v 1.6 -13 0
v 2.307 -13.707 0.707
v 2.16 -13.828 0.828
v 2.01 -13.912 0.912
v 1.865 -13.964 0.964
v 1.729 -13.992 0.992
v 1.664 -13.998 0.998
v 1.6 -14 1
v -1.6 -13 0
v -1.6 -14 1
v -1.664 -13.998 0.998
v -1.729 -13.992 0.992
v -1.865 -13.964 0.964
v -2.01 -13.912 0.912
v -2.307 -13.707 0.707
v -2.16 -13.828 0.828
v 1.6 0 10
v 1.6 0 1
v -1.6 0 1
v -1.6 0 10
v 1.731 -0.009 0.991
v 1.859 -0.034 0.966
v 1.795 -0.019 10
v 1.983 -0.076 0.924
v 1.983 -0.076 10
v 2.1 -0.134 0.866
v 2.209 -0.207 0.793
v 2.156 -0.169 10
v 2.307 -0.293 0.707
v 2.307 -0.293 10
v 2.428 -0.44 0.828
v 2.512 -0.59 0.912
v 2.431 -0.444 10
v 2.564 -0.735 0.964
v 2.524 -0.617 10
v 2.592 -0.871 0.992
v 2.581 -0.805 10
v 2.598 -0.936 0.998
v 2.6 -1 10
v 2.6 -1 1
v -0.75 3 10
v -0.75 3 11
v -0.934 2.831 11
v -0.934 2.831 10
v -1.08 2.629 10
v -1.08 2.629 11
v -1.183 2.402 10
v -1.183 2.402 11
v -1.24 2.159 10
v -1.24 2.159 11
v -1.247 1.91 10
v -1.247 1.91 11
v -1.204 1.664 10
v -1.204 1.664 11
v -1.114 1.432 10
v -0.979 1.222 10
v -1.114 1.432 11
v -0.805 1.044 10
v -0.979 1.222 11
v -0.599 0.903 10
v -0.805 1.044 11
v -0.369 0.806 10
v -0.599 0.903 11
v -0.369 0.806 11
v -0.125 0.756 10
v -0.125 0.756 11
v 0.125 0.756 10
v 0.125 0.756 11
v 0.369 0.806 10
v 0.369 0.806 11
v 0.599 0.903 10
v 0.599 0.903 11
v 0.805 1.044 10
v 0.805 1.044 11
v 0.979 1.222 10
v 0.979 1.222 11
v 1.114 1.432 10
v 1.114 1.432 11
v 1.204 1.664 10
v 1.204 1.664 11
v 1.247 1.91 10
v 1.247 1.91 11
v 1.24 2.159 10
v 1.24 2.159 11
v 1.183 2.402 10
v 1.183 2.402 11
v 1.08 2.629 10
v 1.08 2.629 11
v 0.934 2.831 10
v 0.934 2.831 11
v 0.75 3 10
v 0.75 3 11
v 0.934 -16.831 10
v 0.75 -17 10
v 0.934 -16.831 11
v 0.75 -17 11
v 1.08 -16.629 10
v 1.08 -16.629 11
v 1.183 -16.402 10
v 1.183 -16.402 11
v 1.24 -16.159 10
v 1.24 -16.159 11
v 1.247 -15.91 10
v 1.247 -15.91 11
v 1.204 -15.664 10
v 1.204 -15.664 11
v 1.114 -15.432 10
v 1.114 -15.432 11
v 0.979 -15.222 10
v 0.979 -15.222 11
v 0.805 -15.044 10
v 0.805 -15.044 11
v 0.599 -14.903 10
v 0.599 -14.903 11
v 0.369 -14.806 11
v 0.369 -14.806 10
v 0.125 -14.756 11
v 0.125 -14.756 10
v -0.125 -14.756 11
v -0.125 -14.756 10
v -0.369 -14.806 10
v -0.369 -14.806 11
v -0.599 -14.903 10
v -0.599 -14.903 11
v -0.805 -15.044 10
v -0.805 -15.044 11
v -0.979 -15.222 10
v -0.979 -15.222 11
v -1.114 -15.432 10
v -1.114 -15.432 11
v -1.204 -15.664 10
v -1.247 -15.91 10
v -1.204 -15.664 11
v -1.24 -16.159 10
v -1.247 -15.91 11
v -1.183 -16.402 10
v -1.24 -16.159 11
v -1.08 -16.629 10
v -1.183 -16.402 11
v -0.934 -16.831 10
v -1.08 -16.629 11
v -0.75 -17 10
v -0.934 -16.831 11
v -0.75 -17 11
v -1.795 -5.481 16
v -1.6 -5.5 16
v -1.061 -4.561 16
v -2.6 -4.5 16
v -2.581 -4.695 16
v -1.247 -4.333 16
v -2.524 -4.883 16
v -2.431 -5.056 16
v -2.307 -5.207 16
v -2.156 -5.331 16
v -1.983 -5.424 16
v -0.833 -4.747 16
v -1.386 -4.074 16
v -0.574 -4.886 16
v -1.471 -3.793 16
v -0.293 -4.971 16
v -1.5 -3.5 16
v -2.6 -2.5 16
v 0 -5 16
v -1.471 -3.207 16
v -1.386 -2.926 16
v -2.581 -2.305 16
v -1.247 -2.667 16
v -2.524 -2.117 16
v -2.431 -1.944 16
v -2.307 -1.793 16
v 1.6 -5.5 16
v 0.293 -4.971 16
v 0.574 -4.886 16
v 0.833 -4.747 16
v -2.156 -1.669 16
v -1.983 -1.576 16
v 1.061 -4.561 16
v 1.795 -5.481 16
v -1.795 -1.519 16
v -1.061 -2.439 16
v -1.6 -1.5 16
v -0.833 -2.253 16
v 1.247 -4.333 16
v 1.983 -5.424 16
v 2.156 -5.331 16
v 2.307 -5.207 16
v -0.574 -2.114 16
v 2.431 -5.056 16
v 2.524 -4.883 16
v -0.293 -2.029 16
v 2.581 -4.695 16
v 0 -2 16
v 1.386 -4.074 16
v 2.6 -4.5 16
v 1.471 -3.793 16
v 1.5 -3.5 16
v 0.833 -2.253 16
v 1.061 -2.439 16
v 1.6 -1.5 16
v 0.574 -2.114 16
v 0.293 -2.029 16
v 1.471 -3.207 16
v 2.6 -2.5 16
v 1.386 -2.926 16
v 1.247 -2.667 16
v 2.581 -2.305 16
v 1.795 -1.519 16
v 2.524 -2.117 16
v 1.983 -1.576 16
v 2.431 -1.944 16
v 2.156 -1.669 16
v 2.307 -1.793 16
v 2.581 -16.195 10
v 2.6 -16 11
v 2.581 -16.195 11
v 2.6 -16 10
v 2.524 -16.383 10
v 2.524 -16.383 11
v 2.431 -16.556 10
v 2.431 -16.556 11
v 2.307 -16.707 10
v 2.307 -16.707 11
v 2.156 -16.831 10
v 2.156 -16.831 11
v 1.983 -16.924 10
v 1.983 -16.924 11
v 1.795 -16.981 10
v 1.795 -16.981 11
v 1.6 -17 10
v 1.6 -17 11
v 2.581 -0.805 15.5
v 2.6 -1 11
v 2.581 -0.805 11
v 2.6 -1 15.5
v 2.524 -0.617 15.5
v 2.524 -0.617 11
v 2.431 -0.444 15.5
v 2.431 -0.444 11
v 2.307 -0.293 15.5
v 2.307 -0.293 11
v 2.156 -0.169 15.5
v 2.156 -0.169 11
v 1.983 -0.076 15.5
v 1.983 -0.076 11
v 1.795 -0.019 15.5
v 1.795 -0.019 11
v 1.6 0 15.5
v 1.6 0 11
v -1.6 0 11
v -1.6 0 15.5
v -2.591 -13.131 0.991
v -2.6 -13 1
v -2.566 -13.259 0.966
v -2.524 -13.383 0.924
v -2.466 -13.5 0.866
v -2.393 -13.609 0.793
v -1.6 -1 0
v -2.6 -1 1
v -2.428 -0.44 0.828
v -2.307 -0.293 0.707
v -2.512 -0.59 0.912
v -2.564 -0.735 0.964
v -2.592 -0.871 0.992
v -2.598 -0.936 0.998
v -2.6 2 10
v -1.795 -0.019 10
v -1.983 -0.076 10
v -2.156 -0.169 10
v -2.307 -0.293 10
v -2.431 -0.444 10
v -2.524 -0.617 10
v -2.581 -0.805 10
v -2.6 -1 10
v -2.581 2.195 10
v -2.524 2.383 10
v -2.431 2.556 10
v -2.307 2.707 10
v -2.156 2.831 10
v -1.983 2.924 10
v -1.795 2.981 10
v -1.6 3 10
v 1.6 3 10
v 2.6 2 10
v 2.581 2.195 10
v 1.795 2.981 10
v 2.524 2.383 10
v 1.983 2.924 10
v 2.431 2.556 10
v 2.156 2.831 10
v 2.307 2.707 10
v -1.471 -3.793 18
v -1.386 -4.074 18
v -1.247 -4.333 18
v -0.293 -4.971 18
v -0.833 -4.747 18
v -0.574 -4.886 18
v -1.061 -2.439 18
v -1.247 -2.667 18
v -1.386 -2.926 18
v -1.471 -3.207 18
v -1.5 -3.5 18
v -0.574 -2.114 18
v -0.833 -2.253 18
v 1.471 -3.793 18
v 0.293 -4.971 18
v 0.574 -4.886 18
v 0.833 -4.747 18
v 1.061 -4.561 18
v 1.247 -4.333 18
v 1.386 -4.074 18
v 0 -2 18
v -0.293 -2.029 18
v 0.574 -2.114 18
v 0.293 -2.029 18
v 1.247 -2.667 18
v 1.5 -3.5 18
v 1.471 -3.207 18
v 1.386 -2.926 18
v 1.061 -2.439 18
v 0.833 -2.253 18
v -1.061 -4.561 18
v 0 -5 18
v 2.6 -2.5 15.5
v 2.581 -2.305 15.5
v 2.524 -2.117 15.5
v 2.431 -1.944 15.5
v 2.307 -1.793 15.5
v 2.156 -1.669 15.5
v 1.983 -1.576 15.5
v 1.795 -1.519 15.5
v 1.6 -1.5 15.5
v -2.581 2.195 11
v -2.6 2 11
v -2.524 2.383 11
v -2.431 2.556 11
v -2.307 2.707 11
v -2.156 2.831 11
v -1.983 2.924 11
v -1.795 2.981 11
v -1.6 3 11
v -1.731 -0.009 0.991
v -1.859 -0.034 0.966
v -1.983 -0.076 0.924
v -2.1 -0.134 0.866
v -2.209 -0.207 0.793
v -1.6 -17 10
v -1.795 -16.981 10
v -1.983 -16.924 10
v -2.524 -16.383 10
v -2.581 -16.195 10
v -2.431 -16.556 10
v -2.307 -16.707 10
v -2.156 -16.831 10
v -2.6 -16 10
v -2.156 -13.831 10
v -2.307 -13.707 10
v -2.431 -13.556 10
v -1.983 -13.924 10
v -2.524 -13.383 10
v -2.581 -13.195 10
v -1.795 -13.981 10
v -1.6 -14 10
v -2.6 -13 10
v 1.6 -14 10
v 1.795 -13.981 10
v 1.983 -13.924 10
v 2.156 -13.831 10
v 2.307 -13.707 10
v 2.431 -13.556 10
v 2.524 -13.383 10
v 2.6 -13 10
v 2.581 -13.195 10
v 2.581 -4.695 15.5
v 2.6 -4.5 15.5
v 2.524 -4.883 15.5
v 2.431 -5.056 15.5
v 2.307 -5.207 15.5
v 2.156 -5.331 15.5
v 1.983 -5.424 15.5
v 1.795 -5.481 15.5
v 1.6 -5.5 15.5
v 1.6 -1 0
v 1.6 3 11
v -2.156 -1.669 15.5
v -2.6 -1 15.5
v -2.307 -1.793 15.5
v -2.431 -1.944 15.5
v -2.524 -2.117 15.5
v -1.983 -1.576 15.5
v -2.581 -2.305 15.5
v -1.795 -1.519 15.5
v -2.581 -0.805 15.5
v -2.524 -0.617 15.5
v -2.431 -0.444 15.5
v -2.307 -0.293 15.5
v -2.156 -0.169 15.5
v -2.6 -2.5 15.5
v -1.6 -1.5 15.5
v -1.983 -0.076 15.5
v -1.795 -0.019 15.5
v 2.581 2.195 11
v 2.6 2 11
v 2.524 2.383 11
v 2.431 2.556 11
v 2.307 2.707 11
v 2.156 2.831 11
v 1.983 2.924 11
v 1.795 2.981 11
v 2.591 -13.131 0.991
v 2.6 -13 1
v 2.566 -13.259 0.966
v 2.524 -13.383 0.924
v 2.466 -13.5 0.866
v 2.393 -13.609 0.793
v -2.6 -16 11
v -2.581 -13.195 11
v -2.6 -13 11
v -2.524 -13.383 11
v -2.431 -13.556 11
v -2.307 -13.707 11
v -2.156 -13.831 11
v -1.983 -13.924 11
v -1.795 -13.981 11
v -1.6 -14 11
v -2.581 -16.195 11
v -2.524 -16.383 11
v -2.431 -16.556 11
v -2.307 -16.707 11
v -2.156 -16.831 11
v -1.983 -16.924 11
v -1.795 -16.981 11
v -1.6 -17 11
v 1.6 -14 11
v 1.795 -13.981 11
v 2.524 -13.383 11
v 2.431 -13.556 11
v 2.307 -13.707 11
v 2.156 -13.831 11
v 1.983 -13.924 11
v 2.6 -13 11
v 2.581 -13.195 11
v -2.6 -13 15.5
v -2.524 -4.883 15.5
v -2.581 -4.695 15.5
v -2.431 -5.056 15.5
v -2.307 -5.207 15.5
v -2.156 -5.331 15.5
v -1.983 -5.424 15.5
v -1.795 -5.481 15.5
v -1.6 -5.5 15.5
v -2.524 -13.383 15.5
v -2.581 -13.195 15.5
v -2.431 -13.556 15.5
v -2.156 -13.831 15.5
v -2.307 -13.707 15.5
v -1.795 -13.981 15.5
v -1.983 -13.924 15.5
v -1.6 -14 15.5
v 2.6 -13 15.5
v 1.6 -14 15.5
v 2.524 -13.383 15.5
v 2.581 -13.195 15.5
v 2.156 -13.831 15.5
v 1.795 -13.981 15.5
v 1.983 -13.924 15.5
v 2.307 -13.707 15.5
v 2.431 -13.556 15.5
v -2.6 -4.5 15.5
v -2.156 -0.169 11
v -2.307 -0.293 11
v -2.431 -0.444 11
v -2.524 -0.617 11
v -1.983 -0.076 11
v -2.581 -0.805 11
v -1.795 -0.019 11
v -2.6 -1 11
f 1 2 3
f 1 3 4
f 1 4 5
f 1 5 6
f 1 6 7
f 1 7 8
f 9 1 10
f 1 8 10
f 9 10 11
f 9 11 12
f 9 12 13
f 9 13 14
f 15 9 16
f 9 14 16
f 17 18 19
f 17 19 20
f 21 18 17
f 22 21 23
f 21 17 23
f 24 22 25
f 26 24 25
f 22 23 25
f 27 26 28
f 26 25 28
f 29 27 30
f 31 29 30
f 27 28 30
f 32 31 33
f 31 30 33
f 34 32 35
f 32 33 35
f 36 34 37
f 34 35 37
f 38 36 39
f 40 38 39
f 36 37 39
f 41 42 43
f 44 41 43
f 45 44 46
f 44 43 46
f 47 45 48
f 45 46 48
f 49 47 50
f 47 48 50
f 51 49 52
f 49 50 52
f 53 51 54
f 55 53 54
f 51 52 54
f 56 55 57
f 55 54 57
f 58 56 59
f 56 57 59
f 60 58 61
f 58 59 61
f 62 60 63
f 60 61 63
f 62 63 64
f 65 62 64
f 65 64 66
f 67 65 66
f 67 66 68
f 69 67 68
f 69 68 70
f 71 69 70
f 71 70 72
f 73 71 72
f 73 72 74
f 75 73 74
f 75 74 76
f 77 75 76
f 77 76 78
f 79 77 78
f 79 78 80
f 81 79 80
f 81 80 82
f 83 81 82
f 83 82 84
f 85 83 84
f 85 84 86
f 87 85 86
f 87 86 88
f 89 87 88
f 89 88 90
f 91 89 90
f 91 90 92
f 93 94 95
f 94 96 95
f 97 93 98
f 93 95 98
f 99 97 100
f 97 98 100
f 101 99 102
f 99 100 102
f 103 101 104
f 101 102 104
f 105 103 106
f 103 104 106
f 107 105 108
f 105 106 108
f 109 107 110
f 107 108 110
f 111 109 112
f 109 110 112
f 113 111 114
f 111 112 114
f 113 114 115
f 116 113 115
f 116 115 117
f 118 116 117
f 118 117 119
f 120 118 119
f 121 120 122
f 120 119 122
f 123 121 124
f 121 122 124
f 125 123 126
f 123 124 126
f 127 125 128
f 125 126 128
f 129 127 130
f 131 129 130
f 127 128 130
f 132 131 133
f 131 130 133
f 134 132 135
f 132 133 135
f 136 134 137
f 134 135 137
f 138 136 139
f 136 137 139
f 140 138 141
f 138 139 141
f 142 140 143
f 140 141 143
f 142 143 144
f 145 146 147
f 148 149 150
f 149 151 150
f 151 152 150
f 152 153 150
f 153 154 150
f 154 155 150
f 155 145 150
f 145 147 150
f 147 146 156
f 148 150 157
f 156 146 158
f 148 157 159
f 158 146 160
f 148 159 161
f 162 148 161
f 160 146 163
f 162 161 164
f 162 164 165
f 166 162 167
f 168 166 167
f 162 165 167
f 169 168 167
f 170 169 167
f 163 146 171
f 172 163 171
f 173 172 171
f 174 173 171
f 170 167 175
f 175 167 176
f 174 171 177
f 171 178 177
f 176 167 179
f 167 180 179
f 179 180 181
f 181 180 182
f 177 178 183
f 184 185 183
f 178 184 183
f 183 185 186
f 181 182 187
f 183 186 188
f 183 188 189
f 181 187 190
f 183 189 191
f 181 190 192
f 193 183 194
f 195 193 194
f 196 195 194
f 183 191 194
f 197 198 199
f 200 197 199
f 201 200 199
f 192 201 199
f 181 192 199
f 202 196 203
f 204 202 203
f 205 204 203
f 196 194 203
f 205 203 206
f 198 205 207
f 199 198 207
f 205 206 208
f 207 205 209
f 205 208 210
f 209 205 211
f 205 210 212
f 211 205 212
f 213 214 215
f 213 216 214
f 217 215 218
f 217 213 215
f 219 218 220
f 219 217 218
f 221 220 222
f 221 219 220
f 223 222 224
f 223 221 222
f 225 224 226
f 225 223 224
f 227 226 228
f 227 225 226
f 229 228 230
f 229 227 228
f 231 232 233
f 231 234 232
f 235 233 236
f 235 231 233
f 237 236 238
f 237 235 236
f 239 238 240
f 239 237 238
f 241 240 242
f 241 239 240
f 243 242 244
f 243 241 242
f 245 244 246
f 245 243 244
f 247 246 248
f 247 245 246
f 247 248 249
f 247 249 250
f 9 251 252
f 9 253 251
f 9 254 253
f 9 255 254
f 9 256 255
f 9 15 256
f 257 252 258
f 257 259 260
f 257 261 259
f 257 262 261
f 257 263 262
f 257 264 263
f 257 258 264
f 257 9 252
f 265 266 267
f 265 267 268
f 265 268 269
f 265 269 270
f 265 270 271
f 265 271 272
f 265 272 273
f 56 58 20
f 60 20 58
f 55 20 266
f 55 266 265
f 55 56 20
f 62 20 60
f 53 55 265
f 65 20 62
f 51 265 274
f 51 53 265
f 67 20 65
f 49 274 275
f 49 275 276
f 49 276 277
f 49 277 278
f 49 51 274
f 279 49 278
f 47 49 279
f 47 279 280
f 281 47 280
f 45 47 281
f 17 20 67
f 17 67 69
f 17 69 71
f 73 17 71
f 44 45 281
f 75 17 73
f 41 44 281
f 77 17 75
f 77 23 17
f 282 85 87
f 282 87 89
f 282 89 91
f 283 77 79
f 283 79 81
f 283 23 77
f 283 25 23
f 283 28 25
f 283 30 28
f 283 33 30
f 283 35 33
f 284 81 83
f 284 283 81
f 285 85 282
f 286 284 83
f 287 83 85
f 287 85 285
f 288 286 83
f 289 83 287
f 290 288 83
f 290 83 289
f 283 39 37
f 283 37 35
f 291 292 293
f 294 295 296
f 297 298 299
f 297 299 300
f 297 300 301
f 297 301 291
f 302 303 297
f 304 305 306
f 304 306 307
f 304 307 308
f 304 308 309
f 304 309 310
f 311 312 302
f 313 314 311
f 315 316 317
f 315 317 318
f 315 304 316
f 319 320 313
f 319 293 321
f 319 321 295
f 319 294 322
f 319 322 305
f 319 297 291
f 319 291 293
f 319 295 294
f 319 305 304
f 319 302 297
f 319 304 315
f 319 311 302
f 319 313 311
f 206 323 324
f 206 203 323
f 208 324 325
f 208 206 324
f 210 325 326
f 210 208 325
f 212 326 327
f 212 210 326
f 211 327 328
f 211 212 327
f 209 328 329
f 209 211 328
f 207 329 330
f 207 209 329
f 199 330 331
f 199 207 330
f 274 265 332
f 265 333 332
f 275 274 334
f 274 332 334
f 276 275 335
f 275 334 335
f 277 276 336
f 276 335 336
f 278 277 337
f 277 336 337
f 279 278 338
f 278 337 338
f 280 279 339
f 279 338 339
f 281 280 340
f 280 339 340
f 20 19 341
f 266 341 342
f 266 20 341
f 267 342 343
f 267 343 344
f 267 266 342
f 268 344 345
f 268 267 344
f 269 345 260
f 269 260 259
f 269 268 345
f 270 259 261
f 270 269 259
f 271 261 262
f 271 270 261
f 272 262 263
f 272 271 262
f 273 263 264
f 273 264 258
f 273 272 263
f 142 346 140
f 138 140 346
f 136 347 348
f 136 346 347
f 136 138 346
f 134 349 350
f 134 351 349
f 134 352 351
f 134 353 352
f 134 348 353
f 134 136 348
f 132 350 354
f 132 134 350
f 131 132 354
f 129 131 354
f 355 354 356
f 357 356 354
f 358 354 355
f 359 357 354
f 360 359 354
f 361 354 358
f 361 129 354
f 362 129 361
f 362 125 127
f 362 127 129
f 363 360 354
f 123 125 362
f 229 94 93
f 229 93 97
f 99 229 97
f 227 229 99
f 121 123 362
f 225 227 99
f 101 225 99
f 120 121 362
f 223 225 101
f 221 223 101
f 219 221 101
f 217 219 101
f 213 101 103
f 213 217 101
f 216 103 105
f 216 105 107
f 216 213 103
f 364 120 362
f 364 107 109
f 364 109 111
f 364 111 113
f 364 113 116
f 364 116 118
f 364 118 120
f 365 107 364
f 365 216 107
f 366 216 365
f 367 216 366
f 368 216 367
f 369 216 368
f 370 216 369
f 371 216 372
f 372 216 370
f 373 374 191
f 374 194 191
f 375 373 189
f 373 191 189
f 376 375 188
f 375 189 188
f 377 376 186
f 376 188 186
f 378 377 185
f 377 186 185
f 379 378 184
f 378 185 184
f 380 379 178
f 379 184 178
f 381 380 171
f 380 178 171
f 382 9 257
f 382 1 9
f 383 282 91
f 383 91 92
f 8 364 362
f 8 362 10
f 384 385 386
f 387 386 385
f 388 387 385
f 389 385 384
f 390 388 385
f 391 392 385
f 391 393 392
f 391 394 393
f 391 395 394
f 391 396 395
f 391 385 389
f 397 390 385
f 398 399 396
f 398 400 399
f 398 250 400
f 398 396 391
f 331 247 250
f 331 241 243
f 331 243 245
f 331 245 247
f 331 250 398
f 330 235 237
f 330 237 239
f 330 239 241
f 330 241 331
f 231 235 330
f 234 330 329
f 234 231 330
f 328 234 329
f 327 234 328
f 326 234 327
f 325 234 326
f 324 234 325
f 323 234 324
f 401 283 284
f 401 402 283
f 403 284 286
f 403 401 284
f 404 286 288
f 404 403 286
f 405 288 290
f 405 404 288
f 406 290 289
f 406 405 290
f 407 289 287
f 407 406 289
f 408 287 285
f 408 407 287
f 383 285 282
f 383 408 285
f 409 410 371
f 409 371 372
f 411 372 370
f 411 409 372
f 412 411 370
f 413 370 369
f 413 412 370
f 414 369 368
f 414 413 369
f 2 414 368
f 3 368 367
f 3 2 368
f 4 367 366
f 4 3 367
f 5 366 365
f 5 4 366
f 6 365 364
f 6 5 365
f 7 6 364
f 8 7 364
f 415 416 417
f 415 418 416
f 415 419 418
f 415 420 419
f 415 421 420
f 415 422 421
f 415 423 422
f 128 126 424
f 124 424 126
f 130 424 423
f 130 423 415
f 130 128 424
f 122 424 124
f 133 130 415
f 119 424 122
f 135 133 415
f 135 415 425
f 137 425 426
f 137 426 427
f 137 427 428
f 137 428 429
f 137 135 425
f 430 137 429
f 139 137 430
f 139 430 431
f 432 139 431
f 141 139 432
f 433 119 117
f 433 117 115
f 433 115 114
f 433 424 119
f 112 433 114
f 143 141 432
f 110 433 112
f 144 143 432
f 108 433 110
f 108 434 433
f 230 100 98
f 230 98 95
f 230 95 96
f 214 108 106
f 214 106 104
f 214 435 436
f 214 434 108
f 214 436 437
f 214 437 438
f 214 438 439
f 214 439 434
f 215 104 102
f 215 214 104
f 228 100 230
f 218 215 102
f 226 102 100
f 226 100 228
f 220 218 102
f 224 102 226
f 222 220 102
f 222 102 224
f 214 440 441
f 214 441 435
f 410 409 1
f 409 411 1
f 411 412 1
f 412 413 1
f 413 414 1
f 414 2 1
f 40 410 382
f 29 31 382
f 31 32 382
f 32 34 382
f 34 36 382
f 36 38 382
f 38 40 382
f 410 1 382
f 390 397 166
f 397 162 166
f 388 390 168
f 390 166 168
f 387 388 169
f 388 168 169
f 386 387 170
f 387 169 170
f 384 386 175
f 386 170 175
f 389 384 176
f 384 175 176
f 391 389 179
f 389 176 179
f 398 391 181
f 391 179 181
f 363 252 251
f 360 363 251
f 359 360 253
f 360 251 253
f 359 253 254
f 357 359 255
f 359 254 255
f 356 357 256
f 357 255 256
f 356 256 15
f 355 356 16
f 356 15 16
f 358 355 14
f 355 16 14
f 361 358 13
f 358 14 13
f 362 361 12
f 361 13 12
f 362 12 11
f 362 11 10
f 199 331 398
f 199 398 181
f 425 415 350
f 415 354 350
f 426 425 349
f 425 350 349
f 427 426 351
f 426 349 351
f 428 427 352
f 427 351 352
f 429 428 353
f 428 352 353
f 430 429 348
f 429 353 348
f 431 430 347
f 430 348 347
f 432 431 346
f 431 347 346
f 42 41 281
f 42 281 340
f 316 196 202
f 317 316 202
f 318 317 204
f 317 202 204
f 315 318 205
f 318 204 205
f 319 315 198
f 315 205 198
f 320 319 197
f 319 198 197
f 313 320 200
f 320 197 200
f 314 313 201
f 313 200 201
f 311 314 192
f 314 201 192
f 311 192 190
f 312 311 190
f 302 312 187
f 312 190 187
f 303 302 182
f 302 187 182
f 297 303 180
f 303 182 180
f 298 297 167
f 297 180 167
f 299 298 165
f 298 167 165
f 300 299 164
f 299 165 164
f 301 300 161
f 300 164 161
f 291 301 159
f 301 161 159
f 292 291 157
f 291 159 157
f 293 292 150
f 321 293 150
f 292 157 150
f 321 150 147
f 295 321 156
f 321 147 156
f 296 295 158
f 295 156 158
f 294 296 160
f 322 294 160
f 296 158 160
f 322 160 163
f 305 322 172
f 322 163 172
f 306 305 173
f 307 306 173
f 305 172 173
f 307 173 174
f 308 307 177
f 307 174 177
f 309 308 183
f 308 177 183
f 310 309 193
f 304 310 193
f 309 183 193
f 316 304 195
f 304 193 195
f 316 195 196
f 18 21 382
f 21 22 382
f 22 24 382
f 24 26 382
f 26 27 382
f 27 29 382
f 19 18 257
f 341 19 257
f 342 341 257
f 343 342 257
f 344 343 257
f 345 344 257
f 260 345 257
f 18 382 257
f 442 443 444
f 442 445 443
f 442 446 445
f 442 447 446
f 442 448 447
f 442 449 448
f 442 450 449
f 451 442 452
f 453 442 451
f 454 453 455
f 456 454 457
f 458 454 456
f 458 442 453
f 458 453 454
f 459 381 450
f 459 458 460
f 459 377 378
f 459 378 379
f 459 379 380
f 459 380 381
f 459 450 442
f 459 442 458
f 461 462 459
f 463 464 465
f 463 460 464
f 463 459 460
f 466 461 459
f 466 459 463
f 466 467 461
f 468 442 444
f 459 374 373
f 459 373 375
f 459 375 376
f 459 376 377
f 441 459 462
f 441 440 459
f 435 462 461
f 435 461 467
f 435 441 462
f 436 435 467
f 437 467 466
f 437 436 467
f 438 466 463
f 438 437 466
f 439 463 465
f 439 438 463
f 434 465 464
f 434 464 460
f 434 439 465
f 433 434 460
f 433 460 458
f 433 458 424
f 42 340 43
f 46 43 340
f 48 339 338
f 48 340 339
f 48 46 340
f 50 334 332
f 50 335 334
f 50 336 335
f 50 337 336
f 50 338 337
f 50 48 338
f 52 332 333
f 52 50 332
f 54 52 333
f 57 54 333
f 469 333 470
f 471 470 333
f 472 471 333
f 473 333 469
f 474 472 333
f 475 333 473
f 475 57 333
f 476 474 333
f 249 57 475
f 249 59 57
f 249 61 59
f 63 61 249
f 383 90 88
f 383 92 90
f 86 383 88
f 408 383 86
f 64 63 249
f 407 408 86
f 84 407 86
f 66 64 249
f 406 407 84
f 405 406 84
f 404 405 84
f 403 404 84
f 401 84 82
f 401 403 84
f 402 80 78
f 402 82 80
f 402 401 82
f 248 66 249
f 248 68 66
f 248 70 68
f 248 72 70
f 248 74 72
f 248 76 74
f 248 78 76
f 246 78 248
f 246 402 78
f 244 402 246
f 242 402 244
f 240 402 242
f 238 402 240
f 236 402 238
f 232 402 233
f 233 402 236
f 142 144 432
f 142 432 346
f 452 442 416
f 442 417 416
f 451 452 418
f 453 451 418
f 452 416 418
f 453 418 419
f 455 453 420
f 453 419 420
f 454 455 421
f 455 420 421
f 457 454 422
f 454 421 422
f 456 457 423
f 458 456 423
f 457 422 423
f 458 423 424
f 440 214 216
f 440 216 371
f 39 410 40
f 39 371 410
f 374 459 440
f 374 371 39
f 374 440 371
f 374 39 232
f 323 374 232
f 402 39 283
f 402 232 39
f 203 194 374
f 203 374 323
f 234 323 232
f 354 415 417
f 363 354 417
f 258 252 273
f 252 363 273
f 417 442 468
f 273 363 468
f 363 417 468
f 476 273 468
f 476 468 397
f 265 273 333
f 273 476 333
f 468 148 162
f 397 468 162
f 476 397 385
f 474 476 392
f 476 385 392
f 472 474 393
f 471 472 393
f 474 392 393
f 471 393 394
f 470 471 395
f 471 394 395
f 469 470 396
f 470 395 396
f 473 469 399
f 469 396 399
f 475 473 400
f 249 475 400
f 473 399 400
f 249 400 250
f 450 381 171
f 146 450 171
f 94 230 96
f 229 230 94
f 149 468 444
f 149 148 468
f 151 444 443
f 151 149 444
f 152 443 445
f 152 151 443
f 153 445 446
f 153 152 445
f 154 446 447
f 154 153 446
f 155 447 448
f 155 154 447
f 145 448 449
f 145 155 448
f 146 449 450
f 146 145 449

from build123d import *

# Parameters (mm, degrees)
F0_W     = 4
F0_H     = 0.5
F1_DEPTH = 2.6
F2_R     = 1.5
F3_DEPTH = 2
F4_SIZE  = 1
F5_R     = 1
F6_R     = 1.25
F7_DEPTH = 25


with BuildPart() as f1:
    # F0 (on Right) → F1 (new body, symmetric)
    with BuildSketch(Plane.YZ):
        Polygon((0, 0), (0, 10), (3, 10), (3, 11), (0, 11), (0, 15.5), (-1.5, 15.5), (-5.5, 15.5), (-14, 15.5), (-14, 11), (-17, 11), (-17, 10), (-14, 10), (-14, 0), align=None)
        with Locations((-3.5, 15.75)):
            Rectangle(F0_W, F0_H)
    extrude(amount=F1_DEPTH, both=True)

    # F2 (on face) → F3 (join)
    with BuildSketch(Plane.XY.offset(16)):
        with Locations((0, -3.5)):
            Circle(F2_R)
    extrude(amount=F3_DEPTH)

    # F4
    f4_edges = [f1.edges().sort_by_distance(p)[0] for p in [
        (-2.6, -7, 0),
        (0, 0, 0),
        (2.6, -7, 0),
        (0, -14, 0),
    ]]
    chamfer(f4_edges, length=F4_SIZE)

    # F5
    f5_edges = [f1.edges().sort_by_distance(p)[0] for p in [
        (2.6, 0, 5.5),
        (2.6, 0, 13.25),
        (-2.6, 0, 13.25),
        (2.6, -1.5, 15.75),
        (2.6, -5.5, 15.75),
        (-2.6, -5.5, 15.75),
        (-2.6, -1.5, 15.75),
        (2.6, -14, 13.25),
        (-2.6, -14, 13.25),
        (2.6, -17, 10.5),
        (-2.6, -17, 10.5),
        (2.6, -14, 5.5),
        (-2.6, -14, 5.5),
        (2.6, 3, 10.5),
        (-2.6, 3, 10.5),
        (-2.6, 0, 5.5),
    ]]
    fillet(f5_edges, radius=F5_R)

    # F6 (on face) → F7 (cut)
    with BuildSketch(Plane.XY.offset(11)):
        with Locations((0, 2)):
            Circle(F6_R)
        with Locations((0, -16)):
            Circle(F6_R)
    extrude(amount=-F7_DEPTH, mode=Mode.SUBTRACT)


solid = f1.part
